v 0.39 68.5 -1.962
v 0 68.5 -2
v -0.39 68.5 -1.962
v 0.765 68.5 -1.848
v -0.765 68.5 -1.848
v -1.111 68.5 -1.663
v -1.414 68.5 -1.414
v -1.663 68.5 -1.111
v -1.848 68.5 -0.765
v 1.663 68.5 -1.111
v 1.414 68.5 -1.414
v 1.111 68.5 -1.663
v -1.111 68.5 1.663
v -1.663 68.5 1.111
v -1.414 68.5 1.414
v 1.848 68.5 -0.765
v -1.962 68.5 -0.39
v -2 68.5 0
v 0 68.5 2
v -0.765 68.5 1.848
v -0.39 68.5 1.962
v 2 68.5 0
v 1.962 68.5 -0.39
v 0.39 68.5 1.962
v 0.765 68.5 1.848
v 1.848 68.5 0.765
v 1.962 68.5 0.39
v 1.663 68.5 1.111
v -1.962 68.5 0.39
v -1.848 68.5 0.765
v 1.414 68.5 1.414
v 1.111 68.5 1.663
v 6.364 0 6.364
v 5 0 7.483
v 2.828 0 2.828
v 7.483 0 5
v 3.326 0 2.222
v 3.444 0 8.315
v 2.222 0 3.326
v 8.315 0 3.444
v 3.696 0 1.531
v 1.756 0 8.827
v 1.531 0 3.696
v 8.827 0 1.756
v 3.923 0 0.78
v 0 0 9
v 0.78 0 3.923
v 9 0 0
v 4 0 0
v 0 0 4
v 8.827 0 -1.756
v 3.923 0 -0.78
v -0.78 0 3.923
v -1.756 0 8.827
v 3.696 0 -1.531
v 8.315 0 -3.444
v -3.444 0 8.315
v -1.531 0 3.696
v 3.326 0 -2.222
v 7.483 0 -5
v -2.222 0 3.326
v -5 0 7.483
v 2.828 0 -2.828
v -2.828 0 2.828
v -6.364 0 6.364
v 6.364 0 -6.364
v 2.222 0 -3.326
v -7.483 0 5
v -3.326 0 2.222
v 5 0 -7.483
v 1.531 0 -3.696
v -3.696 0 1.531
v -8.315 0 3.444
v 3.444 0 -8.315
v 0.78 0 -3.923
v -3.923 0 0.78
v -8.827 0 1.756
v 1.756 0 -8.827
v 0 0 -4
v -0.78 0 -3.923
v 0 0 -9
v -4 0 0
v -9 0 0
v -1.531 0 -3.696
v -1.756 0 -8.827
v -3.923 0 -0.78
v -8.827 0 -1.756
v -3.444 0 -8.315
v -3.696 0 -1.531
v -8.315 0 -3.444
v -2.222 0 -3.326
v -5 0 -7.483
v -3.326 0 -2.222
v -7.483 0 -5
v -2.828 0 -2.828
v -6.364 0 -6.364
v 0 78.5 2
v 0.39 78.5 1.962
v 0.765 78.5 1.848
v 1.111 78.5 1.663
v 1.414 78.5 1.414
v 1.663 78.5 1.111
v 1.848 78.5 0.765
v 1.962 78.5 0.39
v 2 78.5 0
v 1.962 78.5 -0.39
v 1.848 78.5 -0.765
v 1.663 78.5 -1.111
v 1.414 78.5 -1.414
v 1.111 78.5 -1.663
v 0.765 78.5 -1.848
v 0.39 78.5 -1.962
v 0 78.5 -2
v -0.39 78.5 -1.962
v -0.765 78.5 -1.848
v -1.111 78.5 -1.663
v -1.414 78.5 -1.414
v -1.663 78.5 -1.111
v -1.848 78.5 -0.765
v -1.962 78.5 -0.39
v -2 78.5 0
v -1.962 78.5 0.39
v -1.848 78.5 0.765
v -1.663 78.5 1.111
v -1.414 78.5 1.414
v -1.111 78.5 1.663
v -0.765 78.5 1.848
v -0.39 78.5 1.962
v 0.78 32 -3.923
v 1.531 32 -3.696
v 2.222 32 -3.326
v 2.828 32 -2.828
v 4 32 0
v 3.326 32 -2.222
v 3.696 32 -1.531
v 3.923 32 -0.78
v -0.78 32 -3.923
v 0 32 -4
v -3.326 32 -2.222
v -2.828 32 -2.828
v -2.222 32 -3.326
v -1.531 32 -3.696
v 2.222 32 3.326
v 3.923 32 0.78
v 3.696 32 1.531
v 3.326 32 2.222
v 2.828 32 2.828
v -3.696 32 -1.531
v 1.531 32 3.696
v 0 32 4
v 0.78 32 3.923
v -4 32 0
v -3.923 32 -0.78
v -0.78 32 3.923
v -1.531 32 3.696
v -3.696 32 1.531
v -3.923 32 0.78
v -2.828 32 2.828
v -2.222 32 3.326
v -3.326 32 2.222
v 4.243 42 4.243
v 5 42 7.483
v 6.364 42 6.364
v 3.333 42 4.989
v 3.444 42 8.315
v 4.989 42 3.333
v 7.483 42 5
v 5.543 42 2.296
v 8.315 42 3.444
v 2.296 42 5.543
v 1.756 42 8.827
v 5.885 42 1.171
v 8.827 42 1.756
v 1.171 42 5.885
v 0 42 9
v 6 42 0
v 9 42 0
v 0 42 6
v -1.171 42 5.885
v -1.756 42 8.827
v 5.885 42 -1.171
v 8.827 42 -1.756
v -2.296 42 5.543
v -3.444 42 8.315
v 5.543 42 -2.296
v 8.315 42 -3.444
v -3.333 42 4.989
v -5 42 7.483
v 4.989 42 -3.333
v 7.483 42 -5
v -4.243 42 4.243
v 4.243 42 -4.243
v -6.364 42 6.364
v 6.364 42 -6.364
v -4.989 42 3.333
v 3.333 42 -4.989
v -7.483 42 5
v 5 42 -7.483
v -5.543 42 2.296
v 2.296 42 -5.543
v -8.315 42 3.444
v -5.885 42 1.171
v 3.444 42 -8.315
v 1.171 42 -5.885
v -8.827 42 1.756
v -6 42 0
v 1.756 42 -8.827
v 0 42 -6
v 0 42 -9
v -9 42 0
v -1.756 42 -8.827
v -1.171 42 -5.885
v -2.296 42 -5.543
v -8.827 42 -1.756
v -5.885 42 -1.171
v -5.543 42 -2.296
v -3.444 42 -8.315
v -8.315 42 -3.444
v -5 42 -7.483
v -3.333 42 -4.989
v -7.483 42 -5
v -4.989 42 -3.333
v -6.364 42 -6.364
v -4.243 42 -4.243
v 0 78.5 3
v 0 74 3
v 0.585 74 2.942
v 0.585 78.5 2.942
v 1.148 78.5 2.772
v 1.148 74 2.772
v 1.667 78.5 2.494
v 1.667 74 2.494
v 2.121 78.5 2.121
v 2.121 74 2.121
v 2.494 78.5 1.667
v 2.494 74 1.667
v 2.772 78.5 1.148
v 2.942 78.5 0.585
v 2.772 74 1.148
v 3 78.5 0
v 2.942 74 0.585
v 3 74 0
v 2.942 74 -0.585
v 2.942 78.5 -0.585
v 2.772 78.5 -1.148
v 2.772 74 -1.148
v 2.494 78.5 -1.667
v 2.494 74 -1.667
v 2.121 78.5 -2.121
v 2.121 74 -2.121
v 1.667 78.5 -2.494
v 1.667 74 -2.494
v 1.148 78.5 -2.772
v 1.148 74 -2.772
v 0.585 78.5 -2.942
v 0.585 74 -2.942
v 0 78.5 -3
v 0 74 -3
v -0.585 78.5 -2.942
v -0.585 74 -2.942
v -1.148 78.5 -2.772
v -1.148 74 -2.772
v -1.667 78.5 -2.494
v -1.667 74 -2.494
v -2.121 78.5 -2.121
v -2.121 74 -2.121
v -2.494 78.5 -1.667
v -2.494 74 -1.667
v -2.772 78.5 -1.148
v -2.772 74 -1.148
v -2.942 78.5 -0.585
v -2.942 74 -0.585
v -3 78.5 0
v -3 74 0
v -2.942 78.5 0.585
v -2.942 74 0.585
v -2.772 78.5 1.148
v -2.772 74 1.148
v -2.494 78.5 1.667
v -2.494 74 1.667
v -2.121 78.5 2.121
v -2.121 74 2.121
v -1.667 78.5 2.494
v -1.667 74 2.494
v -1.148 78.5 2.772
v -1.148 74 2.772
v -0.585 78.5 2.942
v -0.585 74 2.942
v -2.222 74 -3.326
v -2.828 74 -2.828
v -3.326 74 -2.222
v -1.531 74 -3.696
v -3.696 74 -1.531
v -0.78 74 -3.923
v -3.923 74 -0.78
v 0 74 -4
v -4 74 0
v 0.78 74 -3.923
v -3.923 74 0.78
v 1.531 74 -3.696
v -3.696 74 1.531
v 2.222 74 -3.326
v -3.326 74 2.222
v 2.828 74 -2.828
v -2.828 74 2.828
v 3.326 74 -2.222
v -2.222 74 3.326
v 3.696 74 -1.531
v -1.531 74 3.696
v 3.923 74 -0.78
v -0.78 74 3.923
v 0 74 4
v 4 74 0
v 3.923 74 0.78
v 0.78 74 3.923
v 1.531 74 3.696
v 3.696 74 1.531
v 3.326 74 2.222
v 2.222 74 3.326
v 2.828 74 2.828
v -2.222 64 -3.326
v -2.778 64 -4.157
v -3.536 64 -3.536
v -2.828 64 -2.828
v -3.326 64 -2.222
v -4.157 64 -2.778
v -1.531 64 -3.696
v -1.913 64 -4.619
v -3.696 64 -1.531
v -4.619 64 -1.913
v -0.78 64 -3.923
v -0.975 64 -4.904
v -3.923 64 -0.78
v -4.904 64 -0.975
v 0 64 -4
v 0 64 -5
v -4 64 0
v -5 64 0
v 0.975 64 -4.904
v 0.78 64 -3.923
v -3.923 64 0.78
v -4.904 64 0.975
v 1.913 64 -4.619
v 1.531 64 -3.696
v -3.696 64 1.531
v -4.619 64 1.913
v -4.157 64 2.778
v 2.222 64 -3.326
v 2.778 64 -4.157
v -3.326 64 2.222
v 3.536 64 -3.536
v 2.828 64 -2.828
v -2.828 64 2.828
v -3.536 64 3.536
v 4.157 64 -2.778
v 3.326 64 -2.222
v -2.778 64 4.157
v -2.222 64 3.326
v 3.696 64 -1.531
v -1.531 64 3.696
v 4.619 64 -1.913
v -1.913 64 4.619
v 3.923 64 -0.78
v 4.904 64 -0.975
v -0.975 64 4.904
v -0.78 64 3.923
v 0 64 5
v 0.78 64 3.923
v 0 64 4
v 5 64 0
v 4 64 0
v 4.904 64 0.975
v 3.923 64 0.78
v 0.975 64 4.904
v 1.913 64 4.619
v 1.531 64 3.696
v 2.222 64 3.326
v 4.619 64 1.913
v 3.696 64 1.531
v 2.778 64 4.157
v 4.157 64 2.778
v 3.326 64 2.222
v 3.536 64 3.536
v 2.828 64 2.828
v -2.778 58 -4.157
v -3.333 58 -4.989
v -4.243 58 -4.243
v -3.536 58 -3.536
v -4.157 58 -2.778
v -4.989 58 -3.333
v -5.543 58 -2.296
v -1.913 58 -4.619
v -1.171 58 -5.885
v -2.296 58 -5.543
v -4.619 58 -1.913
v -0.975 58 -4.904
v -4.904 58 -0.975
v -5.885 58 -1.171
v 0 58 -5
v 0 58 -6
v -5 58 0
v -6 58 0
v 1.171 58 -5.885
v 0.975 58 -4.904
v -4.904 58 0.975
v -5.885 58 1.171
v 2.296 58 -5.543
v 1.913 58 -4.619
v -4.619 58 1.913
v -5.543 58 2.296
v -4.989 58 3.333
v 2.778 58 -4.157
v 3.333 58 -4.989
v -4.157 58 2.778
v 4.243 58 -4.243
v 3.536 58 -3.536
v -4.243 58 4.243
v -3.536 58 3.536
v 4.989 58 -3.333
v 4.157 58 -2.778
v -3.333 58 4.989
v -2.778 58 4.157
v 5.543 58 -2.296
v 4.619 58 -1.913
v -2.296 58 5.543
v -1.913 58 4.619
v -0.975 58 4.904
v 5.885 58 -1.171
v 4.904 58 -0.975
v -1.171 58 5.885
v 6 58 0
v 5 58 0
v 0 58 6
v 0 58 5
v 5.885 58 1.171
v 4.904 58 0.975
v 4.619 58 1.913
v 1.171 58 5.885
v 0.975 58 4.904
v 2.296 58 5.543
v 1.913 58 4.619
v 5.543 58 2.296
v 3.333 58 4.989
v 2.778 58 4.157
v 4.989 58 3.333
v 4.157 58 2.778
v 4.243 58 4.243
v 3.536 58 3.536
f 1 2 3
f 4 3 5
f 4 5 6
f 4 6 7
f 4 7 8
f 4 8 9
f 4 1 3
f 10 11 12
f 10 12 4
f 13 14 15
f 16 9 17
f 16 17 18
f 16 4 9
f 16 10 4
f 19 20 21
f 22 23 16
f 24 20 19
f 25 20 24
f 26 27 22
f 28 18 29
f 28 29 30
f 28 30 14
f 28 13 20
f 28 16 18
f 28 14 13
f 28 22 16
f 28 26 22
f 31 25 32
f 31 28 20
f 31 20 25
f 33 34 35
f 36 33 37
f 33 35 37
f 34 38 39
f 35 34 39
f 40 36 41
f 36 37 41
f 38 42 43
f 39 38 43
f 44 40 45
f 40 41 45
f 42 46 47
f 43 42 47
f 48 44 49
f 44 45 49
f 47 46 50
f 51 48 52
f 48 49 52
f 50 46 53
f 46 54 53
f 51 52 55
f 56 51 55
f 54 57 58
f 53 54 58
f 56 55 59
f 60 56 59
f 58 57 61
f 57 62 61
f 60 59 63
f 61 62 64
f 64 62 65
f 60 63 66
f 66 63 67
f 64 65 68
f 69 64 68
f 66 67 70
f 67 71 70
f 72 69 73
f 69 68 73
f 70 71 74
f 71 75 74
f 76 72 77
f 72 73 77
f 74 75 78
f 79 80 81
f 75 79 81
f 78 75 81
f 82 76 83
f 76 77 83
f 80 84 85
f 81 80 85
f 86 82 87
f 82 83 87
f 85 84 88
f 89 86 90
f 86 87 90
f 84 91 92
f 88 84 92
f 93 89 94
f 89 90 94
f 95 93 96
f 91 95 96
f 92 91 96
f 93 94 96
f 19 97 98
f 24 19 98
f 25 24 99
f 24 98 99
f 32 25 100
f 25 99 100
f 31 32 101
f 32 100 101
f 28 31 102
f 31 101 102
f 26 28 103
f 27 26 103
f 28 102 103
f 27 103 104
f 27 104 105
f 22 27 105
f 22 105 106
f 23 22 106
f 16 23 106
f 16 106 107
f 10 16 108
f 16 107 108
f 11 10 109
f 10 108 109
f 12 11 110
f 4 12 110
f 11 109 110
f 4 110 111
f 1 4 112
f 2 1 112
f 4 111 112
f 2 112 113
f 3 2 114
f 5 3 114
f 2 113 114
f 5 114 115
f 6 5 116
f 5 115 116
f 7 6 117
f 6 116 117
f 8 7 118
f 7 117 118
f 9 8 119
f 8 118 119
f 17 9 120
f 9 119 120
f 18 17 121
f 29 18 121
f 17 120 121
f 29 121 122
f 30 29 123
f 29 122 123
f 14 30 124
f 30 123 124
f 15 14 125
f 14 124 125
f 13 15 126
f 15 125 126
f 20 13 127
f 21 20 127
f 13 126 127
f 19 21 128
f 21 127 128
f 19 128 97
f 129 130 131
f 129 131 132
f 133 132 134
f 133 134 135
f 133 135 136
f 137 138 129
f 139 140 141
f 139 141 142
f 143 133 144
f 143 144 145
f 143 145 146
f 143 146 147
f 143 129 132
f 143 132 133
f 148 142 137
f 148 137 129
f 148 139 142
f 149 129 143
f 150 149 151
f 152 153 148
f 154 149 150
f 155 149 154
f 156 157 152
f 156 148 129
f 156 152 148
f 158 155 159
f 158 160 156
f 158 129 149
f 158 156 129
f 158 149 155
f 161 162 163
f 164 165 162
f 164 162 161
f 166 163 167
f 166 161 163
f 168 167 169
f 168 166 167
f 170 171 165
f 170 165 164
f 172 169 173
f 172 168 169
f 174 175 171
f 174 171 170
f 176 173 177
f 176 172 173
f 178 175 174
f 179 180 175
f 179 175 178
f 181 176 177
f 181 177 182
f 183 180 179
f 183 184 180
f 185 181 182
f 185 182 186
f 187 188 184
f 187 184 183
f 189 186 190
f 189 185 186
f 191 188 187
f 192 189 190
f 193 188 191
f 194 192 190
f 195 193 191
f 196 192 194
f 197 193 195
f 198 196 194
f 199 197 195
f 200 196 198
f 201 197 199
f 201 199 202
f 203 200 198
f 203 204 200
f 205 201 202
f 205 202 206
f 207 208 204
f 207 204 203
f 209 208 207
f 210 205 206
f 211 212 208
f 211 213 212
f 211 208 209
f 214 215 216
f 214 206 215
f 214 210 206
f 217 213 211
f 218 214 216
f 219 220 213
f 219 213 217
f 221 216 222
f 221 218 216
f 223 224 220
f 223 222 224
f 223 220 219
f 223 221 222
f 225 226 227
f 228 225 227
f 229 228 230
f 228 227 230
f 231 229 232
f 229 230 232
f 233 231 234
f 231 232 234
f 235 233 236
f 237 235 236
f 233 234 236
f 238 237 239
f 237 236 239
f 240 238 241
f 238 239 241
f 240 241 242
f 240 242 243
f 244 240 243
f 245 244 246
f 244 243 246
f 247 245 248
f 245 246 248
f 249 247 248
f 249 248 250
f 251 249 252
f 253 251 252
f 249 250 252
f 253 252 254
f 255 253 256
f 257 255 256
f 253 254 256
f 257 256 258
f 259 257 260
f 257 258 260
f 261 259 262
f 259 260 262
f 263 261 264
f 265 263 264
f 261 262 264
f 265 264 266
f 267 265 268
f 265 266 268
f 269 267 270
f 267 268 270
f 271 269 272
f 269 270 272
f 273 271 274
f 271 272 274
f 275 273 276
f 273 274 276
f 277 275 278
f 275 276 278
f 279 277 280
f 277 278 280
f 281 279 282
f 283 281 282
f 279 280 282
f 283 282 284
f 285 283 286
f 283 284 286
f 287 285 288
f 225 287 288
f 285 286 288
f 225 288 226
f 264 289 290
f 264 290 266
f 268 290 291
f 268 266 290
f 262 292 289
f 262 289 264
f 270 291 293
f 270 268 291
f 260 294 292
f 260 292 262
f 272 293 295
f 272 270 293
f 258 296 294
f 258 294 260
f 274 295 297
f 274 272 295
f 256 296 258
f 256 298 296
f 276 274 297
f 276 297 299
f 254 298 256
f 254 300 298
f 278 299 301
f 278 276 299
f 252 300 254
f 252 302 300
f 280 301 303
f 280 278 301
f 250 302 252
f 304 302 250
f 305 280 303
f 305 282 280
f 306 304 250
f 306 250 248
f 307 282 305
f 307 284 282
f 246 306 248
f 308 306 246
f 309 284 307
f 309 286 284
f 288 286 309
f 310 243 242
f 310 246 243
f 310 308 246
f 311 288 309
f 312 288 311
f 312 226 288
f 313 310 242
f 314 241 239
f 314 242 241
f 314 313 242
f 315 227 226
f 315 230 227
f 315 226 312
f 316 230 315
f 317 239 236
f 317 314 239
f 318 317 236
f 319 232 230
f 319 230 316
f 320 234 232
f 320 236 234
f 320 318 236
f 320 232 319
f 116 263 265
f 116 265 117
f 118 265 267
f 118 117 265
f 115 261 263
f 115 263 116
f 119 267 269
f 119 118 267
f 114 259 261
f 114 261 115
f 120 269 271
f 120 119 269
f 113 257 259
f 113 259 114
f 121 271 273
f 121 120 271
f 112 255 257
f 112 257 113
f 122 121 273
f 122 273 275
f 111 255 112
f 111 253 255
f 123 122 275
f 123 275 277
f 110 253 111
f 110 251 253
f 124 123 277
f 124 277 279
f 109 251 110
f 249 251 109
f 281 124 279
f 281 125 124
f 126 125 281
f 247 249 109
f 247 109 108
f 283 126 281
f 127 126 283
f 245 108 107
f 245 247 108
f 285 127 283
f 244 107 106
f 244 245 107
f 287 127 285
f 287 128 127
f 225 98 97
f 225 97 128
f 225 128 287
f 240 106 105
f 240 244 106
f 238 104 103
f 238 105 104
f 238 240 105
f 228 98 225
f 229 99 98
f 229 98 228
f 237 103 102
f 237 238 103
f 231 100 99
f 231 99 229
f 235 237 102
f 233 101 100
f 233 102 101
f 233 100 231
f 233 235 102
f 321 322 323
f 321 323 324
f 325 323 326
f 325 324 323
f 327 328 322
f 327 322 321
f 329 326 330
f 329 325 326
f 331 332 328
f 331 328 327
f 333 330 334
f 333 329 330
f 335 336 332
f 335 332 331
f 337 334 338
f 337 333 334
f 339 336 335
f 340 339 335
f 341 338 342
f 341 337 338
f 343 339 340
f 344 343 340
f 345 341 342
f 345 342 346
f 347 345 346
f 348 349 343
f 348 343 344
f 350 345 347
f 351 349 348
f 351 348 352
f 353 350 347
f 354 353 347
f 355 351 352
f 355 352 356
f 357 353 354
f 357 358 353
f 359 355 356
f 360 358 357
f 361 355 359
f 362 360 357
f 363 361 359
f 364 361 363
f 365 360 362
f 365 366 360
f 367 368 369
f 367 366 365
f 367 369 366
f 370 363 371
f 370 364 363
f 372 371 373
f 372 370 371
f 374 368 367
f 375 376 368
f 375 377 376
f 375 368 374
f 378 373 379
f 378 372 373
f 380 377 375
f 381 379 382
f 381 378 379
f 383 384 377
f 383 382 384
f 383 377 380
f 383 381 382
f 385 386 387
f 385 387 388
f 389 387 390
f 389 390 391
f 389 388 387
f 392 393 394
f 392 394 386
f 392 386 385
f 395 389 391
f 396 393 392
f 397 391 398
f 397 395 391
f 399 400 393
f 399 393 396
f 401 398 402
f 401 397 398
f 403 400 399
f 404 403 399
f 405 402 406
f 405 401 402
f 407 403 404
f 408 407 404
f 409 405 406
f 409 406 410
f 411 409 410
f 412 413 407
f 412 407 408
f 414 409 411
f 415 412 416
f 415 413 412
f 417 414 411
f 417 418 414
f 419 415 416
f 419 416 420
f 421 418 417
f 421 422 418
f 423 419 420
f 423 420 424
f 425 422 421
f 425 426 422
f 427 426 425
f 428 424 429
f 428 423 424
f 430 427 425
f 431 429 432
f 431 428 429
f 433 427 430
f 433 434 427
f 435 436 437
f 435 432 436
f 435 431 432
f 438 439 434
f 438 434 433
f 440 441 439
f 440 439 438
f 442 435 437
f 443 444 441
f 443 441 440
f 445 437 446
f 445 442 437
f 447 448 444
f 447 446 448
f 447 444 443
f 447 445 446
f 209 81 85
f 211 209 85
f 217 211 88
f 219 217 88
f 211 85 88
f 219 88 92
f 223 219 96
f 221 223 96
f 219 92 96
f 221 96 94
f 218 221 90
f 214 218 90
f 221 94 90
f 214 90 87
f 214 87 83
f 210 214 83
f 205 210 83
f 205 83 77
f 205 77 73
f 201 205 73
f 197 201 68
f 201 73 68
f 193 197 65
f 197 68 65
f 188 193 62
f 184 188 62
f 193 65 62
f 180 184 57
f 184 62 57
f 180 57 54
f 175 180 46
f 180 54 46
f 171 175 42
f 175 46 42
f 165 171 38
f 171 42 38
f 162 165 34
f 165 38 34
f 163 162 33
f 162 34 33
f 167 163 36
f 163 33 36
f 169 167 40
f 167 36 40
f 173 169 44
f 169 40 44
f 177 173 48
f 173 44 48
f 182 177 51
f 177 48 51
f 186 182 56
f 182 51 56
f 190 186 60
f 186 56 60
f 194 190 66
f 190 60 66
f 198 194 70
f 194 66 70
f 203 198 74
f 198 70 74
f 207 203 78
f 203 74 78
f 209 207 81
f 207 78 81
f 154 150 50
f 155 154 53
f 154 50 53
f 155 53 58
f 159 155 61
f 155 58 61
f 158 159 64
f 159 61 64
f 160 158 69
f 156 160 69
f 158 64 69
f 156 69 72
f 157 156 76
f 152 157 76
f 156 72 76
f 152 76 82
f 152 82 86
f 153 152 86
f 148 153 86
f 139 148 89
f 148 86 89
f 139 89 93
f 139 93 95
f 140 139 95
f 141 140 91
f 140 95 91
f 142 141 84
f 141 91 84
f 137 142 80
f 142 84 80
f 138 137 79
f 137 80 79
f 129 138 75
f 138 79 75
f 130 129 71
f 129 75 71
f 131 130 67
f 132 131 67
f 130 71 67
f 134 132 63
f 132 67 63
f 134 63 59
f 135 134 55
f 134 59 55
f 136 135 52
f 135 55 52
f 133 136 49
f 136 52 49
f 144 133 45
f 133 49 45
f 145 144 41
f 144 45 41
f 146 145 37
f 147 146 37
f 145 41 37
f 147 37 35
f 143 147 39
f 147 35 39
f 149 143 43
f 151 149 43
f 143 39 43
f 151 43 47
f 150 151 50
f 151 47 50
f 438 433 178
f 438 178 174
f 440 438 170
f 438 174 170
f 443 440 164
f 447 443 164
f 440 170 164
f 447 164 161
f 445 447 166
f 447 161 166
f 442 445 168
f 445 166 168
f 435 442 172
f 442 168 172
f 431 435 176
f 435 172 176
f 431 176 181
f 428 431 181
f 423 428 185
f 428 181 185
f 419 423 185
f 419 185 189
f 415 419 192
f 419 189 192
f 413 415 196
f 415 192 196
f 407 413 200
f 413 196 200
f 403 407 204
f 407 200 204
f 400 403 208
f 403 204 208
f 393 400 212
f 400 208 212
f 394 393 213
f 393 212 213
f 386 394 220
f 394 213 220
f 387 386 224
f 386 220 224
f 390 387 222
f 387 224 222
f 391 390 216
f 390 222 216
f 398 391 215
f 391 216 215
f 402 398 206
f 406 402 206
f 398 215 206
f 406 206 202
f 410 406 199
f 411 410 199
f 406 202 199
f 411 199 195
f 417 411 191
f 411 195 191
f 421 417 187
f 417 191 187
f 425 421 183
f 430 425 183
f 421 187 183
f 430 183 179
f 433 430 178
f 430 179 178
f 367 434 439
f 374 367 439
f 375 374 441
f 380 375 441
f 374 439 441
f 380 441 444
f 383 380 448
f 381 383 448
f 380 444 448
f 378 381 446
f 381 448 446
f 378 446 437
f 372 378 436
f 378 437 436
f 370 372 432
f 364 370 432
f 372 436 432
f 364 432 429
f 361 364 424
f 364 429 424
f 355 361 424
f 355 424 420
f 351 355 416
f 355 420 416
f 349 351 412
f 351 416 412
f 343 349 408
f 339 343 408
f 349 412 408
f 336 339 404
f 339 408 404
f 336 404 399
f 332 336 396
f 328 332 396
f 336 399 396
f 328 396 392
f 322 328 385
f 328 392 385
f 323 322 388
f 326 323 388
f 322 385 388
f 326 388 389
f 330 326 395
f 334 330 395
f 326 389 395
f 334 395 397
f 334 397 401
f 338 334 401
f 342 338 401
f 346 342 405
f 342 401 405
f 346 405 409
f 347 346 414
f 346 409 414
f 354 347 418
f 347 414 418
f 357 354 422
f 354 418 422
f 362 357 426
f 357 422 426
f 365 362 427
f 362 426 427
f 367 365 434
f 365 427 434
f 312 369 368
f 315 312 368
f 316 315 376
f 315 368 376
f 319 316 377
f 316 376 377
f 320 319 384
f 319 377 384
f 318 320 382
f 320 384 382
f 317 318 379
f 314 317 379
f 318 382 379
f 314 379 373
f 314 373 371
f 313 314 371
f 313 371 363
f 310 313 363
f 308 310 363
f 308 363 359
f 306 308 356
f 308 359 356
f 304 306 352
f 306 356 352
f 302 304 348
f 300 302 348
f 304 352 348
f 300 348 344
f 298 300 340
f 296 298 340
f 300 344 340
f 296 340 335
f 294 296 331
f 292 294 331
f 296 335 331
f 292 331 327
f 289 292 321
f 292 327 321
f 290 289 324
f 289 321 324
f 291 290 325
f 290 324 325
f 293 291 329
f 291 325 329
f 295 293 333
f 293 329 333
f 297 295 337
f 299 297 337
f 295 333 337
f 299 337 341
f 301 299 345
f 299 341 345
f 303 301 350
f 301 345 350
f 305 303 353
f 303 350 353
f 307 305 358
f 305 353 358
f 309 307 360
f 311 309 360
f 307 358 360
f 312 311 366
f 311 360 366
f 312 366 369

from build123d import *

# Parameters (mm, degrees)
SKETCH1_R                 = 9
BASE_SECTION_DEPTH        = 42
SKETCH2_R                 = 6
SECOND_SECTION_DEPTH      = 16
SKETCH3_R                 = 5
BEARING_SECTION_DEPTH     = 6
SKETCH4_R                 = 4
SEAL_SECTION_DEPTH        = 10
SKETCH5_R                 = 3
IMPELLER_SECTION_DEPTH    = 4.5
SKETCH6_R                 = 2
IMPELLER_SCREW_HOLE_DEPTH = 10
SKETCH7_R                 = 4
MOTOR_SHAFT_HOLE_DEPTH    = 32


with BuildPart() as part:
    # Sketch1 → base section (new body)
    with BuildSketch(Plane(origin=(0, 0, 0), x_dir=(1, 0, 0), z_dir=(0, 1, 0))):
        with Locations(Location((0, 0, 0), (0, 0, 90))):
            Circle(SKETCH1_R)
    extrude(amount=BASE_SECTION_DEPTH)

    # Sketch2 → second section (add)
    with BuildSketch(Plane(origin=(0, 42, 0), x_dir=(1, 0, 0), z_dir=(0, 1, 0))):
        with Locations(Location((0, 0, 0), (0, 0, 270))):
            Circle(SKETCH2_R)
    extrude(amount=SECOND_SECTION_DEPTH)

    # Sketch3 → bearing section (add)
    with BuildSketch(Plane(origin=(0, 58, 0), x_dir=(1, 0, 0), z_dir=(0, 1, 0))):
        with Locations(Location((0, 0, 0), (0, 0, 270))):
            Circle(SKETCH3_R)
    extrude(amount=BEARING_SECTION_DEPTH)

    # Sketch4 → seal section (add)
    with BuildSketch(Plane(origin=(0, 64, 0), x_dir=(1, 0, 0), z_dir=(0, 1, 0))):
        with Locations(Location((0, 0, 0), (0, 0, 270))):
            Circle(SKETCH4_R)
    extrude(amount=SEAL_SECTION_DEPTH)

    # Sketch5 → impeller section (add)
    with BuildSketch(Plane(origin=(0, 74, 0), x_dir=(1, 0, 0), z_dir=(0, 1, 0))):
        with Locations(Location((0, 0, 0), (0, 0, 270))):
            Circle(SKETCH5_R)
    extrude(amount=IMPELLER_SECTION_DEPTH)

    # Sketch6 → impeller screw hole (cut)
    with BuildSketch(Plane(origin=(0, 78.5, 0), x_dir=(1, 0, 0), z_dir=(0, 1, 0))):
        with Locations(Location((0, 0, 0), (0, 0, 270))):
            Circle(SKETCH6_R)
    extrude(amount=-IMPELLER_SCREW_HOLE_DEPTH, mode=Mode.SUBTRACT)

    # Sketch7 → motor shaft hole (cut)
    with BuildSketch(Plane(origin=(0, 0, 0), x_dir=(-1, 0, 0), z_dir=(0, -1, 0))):
        with Locations(Location((0, 0, 0), (0, 0, 270))):
            Circle(SKETCH7_R)
    extrude(amount=-MOTOR_SHAFT_HOLE_DEPTH, mode=Mode.SUBTRACT)


solid = part.part
